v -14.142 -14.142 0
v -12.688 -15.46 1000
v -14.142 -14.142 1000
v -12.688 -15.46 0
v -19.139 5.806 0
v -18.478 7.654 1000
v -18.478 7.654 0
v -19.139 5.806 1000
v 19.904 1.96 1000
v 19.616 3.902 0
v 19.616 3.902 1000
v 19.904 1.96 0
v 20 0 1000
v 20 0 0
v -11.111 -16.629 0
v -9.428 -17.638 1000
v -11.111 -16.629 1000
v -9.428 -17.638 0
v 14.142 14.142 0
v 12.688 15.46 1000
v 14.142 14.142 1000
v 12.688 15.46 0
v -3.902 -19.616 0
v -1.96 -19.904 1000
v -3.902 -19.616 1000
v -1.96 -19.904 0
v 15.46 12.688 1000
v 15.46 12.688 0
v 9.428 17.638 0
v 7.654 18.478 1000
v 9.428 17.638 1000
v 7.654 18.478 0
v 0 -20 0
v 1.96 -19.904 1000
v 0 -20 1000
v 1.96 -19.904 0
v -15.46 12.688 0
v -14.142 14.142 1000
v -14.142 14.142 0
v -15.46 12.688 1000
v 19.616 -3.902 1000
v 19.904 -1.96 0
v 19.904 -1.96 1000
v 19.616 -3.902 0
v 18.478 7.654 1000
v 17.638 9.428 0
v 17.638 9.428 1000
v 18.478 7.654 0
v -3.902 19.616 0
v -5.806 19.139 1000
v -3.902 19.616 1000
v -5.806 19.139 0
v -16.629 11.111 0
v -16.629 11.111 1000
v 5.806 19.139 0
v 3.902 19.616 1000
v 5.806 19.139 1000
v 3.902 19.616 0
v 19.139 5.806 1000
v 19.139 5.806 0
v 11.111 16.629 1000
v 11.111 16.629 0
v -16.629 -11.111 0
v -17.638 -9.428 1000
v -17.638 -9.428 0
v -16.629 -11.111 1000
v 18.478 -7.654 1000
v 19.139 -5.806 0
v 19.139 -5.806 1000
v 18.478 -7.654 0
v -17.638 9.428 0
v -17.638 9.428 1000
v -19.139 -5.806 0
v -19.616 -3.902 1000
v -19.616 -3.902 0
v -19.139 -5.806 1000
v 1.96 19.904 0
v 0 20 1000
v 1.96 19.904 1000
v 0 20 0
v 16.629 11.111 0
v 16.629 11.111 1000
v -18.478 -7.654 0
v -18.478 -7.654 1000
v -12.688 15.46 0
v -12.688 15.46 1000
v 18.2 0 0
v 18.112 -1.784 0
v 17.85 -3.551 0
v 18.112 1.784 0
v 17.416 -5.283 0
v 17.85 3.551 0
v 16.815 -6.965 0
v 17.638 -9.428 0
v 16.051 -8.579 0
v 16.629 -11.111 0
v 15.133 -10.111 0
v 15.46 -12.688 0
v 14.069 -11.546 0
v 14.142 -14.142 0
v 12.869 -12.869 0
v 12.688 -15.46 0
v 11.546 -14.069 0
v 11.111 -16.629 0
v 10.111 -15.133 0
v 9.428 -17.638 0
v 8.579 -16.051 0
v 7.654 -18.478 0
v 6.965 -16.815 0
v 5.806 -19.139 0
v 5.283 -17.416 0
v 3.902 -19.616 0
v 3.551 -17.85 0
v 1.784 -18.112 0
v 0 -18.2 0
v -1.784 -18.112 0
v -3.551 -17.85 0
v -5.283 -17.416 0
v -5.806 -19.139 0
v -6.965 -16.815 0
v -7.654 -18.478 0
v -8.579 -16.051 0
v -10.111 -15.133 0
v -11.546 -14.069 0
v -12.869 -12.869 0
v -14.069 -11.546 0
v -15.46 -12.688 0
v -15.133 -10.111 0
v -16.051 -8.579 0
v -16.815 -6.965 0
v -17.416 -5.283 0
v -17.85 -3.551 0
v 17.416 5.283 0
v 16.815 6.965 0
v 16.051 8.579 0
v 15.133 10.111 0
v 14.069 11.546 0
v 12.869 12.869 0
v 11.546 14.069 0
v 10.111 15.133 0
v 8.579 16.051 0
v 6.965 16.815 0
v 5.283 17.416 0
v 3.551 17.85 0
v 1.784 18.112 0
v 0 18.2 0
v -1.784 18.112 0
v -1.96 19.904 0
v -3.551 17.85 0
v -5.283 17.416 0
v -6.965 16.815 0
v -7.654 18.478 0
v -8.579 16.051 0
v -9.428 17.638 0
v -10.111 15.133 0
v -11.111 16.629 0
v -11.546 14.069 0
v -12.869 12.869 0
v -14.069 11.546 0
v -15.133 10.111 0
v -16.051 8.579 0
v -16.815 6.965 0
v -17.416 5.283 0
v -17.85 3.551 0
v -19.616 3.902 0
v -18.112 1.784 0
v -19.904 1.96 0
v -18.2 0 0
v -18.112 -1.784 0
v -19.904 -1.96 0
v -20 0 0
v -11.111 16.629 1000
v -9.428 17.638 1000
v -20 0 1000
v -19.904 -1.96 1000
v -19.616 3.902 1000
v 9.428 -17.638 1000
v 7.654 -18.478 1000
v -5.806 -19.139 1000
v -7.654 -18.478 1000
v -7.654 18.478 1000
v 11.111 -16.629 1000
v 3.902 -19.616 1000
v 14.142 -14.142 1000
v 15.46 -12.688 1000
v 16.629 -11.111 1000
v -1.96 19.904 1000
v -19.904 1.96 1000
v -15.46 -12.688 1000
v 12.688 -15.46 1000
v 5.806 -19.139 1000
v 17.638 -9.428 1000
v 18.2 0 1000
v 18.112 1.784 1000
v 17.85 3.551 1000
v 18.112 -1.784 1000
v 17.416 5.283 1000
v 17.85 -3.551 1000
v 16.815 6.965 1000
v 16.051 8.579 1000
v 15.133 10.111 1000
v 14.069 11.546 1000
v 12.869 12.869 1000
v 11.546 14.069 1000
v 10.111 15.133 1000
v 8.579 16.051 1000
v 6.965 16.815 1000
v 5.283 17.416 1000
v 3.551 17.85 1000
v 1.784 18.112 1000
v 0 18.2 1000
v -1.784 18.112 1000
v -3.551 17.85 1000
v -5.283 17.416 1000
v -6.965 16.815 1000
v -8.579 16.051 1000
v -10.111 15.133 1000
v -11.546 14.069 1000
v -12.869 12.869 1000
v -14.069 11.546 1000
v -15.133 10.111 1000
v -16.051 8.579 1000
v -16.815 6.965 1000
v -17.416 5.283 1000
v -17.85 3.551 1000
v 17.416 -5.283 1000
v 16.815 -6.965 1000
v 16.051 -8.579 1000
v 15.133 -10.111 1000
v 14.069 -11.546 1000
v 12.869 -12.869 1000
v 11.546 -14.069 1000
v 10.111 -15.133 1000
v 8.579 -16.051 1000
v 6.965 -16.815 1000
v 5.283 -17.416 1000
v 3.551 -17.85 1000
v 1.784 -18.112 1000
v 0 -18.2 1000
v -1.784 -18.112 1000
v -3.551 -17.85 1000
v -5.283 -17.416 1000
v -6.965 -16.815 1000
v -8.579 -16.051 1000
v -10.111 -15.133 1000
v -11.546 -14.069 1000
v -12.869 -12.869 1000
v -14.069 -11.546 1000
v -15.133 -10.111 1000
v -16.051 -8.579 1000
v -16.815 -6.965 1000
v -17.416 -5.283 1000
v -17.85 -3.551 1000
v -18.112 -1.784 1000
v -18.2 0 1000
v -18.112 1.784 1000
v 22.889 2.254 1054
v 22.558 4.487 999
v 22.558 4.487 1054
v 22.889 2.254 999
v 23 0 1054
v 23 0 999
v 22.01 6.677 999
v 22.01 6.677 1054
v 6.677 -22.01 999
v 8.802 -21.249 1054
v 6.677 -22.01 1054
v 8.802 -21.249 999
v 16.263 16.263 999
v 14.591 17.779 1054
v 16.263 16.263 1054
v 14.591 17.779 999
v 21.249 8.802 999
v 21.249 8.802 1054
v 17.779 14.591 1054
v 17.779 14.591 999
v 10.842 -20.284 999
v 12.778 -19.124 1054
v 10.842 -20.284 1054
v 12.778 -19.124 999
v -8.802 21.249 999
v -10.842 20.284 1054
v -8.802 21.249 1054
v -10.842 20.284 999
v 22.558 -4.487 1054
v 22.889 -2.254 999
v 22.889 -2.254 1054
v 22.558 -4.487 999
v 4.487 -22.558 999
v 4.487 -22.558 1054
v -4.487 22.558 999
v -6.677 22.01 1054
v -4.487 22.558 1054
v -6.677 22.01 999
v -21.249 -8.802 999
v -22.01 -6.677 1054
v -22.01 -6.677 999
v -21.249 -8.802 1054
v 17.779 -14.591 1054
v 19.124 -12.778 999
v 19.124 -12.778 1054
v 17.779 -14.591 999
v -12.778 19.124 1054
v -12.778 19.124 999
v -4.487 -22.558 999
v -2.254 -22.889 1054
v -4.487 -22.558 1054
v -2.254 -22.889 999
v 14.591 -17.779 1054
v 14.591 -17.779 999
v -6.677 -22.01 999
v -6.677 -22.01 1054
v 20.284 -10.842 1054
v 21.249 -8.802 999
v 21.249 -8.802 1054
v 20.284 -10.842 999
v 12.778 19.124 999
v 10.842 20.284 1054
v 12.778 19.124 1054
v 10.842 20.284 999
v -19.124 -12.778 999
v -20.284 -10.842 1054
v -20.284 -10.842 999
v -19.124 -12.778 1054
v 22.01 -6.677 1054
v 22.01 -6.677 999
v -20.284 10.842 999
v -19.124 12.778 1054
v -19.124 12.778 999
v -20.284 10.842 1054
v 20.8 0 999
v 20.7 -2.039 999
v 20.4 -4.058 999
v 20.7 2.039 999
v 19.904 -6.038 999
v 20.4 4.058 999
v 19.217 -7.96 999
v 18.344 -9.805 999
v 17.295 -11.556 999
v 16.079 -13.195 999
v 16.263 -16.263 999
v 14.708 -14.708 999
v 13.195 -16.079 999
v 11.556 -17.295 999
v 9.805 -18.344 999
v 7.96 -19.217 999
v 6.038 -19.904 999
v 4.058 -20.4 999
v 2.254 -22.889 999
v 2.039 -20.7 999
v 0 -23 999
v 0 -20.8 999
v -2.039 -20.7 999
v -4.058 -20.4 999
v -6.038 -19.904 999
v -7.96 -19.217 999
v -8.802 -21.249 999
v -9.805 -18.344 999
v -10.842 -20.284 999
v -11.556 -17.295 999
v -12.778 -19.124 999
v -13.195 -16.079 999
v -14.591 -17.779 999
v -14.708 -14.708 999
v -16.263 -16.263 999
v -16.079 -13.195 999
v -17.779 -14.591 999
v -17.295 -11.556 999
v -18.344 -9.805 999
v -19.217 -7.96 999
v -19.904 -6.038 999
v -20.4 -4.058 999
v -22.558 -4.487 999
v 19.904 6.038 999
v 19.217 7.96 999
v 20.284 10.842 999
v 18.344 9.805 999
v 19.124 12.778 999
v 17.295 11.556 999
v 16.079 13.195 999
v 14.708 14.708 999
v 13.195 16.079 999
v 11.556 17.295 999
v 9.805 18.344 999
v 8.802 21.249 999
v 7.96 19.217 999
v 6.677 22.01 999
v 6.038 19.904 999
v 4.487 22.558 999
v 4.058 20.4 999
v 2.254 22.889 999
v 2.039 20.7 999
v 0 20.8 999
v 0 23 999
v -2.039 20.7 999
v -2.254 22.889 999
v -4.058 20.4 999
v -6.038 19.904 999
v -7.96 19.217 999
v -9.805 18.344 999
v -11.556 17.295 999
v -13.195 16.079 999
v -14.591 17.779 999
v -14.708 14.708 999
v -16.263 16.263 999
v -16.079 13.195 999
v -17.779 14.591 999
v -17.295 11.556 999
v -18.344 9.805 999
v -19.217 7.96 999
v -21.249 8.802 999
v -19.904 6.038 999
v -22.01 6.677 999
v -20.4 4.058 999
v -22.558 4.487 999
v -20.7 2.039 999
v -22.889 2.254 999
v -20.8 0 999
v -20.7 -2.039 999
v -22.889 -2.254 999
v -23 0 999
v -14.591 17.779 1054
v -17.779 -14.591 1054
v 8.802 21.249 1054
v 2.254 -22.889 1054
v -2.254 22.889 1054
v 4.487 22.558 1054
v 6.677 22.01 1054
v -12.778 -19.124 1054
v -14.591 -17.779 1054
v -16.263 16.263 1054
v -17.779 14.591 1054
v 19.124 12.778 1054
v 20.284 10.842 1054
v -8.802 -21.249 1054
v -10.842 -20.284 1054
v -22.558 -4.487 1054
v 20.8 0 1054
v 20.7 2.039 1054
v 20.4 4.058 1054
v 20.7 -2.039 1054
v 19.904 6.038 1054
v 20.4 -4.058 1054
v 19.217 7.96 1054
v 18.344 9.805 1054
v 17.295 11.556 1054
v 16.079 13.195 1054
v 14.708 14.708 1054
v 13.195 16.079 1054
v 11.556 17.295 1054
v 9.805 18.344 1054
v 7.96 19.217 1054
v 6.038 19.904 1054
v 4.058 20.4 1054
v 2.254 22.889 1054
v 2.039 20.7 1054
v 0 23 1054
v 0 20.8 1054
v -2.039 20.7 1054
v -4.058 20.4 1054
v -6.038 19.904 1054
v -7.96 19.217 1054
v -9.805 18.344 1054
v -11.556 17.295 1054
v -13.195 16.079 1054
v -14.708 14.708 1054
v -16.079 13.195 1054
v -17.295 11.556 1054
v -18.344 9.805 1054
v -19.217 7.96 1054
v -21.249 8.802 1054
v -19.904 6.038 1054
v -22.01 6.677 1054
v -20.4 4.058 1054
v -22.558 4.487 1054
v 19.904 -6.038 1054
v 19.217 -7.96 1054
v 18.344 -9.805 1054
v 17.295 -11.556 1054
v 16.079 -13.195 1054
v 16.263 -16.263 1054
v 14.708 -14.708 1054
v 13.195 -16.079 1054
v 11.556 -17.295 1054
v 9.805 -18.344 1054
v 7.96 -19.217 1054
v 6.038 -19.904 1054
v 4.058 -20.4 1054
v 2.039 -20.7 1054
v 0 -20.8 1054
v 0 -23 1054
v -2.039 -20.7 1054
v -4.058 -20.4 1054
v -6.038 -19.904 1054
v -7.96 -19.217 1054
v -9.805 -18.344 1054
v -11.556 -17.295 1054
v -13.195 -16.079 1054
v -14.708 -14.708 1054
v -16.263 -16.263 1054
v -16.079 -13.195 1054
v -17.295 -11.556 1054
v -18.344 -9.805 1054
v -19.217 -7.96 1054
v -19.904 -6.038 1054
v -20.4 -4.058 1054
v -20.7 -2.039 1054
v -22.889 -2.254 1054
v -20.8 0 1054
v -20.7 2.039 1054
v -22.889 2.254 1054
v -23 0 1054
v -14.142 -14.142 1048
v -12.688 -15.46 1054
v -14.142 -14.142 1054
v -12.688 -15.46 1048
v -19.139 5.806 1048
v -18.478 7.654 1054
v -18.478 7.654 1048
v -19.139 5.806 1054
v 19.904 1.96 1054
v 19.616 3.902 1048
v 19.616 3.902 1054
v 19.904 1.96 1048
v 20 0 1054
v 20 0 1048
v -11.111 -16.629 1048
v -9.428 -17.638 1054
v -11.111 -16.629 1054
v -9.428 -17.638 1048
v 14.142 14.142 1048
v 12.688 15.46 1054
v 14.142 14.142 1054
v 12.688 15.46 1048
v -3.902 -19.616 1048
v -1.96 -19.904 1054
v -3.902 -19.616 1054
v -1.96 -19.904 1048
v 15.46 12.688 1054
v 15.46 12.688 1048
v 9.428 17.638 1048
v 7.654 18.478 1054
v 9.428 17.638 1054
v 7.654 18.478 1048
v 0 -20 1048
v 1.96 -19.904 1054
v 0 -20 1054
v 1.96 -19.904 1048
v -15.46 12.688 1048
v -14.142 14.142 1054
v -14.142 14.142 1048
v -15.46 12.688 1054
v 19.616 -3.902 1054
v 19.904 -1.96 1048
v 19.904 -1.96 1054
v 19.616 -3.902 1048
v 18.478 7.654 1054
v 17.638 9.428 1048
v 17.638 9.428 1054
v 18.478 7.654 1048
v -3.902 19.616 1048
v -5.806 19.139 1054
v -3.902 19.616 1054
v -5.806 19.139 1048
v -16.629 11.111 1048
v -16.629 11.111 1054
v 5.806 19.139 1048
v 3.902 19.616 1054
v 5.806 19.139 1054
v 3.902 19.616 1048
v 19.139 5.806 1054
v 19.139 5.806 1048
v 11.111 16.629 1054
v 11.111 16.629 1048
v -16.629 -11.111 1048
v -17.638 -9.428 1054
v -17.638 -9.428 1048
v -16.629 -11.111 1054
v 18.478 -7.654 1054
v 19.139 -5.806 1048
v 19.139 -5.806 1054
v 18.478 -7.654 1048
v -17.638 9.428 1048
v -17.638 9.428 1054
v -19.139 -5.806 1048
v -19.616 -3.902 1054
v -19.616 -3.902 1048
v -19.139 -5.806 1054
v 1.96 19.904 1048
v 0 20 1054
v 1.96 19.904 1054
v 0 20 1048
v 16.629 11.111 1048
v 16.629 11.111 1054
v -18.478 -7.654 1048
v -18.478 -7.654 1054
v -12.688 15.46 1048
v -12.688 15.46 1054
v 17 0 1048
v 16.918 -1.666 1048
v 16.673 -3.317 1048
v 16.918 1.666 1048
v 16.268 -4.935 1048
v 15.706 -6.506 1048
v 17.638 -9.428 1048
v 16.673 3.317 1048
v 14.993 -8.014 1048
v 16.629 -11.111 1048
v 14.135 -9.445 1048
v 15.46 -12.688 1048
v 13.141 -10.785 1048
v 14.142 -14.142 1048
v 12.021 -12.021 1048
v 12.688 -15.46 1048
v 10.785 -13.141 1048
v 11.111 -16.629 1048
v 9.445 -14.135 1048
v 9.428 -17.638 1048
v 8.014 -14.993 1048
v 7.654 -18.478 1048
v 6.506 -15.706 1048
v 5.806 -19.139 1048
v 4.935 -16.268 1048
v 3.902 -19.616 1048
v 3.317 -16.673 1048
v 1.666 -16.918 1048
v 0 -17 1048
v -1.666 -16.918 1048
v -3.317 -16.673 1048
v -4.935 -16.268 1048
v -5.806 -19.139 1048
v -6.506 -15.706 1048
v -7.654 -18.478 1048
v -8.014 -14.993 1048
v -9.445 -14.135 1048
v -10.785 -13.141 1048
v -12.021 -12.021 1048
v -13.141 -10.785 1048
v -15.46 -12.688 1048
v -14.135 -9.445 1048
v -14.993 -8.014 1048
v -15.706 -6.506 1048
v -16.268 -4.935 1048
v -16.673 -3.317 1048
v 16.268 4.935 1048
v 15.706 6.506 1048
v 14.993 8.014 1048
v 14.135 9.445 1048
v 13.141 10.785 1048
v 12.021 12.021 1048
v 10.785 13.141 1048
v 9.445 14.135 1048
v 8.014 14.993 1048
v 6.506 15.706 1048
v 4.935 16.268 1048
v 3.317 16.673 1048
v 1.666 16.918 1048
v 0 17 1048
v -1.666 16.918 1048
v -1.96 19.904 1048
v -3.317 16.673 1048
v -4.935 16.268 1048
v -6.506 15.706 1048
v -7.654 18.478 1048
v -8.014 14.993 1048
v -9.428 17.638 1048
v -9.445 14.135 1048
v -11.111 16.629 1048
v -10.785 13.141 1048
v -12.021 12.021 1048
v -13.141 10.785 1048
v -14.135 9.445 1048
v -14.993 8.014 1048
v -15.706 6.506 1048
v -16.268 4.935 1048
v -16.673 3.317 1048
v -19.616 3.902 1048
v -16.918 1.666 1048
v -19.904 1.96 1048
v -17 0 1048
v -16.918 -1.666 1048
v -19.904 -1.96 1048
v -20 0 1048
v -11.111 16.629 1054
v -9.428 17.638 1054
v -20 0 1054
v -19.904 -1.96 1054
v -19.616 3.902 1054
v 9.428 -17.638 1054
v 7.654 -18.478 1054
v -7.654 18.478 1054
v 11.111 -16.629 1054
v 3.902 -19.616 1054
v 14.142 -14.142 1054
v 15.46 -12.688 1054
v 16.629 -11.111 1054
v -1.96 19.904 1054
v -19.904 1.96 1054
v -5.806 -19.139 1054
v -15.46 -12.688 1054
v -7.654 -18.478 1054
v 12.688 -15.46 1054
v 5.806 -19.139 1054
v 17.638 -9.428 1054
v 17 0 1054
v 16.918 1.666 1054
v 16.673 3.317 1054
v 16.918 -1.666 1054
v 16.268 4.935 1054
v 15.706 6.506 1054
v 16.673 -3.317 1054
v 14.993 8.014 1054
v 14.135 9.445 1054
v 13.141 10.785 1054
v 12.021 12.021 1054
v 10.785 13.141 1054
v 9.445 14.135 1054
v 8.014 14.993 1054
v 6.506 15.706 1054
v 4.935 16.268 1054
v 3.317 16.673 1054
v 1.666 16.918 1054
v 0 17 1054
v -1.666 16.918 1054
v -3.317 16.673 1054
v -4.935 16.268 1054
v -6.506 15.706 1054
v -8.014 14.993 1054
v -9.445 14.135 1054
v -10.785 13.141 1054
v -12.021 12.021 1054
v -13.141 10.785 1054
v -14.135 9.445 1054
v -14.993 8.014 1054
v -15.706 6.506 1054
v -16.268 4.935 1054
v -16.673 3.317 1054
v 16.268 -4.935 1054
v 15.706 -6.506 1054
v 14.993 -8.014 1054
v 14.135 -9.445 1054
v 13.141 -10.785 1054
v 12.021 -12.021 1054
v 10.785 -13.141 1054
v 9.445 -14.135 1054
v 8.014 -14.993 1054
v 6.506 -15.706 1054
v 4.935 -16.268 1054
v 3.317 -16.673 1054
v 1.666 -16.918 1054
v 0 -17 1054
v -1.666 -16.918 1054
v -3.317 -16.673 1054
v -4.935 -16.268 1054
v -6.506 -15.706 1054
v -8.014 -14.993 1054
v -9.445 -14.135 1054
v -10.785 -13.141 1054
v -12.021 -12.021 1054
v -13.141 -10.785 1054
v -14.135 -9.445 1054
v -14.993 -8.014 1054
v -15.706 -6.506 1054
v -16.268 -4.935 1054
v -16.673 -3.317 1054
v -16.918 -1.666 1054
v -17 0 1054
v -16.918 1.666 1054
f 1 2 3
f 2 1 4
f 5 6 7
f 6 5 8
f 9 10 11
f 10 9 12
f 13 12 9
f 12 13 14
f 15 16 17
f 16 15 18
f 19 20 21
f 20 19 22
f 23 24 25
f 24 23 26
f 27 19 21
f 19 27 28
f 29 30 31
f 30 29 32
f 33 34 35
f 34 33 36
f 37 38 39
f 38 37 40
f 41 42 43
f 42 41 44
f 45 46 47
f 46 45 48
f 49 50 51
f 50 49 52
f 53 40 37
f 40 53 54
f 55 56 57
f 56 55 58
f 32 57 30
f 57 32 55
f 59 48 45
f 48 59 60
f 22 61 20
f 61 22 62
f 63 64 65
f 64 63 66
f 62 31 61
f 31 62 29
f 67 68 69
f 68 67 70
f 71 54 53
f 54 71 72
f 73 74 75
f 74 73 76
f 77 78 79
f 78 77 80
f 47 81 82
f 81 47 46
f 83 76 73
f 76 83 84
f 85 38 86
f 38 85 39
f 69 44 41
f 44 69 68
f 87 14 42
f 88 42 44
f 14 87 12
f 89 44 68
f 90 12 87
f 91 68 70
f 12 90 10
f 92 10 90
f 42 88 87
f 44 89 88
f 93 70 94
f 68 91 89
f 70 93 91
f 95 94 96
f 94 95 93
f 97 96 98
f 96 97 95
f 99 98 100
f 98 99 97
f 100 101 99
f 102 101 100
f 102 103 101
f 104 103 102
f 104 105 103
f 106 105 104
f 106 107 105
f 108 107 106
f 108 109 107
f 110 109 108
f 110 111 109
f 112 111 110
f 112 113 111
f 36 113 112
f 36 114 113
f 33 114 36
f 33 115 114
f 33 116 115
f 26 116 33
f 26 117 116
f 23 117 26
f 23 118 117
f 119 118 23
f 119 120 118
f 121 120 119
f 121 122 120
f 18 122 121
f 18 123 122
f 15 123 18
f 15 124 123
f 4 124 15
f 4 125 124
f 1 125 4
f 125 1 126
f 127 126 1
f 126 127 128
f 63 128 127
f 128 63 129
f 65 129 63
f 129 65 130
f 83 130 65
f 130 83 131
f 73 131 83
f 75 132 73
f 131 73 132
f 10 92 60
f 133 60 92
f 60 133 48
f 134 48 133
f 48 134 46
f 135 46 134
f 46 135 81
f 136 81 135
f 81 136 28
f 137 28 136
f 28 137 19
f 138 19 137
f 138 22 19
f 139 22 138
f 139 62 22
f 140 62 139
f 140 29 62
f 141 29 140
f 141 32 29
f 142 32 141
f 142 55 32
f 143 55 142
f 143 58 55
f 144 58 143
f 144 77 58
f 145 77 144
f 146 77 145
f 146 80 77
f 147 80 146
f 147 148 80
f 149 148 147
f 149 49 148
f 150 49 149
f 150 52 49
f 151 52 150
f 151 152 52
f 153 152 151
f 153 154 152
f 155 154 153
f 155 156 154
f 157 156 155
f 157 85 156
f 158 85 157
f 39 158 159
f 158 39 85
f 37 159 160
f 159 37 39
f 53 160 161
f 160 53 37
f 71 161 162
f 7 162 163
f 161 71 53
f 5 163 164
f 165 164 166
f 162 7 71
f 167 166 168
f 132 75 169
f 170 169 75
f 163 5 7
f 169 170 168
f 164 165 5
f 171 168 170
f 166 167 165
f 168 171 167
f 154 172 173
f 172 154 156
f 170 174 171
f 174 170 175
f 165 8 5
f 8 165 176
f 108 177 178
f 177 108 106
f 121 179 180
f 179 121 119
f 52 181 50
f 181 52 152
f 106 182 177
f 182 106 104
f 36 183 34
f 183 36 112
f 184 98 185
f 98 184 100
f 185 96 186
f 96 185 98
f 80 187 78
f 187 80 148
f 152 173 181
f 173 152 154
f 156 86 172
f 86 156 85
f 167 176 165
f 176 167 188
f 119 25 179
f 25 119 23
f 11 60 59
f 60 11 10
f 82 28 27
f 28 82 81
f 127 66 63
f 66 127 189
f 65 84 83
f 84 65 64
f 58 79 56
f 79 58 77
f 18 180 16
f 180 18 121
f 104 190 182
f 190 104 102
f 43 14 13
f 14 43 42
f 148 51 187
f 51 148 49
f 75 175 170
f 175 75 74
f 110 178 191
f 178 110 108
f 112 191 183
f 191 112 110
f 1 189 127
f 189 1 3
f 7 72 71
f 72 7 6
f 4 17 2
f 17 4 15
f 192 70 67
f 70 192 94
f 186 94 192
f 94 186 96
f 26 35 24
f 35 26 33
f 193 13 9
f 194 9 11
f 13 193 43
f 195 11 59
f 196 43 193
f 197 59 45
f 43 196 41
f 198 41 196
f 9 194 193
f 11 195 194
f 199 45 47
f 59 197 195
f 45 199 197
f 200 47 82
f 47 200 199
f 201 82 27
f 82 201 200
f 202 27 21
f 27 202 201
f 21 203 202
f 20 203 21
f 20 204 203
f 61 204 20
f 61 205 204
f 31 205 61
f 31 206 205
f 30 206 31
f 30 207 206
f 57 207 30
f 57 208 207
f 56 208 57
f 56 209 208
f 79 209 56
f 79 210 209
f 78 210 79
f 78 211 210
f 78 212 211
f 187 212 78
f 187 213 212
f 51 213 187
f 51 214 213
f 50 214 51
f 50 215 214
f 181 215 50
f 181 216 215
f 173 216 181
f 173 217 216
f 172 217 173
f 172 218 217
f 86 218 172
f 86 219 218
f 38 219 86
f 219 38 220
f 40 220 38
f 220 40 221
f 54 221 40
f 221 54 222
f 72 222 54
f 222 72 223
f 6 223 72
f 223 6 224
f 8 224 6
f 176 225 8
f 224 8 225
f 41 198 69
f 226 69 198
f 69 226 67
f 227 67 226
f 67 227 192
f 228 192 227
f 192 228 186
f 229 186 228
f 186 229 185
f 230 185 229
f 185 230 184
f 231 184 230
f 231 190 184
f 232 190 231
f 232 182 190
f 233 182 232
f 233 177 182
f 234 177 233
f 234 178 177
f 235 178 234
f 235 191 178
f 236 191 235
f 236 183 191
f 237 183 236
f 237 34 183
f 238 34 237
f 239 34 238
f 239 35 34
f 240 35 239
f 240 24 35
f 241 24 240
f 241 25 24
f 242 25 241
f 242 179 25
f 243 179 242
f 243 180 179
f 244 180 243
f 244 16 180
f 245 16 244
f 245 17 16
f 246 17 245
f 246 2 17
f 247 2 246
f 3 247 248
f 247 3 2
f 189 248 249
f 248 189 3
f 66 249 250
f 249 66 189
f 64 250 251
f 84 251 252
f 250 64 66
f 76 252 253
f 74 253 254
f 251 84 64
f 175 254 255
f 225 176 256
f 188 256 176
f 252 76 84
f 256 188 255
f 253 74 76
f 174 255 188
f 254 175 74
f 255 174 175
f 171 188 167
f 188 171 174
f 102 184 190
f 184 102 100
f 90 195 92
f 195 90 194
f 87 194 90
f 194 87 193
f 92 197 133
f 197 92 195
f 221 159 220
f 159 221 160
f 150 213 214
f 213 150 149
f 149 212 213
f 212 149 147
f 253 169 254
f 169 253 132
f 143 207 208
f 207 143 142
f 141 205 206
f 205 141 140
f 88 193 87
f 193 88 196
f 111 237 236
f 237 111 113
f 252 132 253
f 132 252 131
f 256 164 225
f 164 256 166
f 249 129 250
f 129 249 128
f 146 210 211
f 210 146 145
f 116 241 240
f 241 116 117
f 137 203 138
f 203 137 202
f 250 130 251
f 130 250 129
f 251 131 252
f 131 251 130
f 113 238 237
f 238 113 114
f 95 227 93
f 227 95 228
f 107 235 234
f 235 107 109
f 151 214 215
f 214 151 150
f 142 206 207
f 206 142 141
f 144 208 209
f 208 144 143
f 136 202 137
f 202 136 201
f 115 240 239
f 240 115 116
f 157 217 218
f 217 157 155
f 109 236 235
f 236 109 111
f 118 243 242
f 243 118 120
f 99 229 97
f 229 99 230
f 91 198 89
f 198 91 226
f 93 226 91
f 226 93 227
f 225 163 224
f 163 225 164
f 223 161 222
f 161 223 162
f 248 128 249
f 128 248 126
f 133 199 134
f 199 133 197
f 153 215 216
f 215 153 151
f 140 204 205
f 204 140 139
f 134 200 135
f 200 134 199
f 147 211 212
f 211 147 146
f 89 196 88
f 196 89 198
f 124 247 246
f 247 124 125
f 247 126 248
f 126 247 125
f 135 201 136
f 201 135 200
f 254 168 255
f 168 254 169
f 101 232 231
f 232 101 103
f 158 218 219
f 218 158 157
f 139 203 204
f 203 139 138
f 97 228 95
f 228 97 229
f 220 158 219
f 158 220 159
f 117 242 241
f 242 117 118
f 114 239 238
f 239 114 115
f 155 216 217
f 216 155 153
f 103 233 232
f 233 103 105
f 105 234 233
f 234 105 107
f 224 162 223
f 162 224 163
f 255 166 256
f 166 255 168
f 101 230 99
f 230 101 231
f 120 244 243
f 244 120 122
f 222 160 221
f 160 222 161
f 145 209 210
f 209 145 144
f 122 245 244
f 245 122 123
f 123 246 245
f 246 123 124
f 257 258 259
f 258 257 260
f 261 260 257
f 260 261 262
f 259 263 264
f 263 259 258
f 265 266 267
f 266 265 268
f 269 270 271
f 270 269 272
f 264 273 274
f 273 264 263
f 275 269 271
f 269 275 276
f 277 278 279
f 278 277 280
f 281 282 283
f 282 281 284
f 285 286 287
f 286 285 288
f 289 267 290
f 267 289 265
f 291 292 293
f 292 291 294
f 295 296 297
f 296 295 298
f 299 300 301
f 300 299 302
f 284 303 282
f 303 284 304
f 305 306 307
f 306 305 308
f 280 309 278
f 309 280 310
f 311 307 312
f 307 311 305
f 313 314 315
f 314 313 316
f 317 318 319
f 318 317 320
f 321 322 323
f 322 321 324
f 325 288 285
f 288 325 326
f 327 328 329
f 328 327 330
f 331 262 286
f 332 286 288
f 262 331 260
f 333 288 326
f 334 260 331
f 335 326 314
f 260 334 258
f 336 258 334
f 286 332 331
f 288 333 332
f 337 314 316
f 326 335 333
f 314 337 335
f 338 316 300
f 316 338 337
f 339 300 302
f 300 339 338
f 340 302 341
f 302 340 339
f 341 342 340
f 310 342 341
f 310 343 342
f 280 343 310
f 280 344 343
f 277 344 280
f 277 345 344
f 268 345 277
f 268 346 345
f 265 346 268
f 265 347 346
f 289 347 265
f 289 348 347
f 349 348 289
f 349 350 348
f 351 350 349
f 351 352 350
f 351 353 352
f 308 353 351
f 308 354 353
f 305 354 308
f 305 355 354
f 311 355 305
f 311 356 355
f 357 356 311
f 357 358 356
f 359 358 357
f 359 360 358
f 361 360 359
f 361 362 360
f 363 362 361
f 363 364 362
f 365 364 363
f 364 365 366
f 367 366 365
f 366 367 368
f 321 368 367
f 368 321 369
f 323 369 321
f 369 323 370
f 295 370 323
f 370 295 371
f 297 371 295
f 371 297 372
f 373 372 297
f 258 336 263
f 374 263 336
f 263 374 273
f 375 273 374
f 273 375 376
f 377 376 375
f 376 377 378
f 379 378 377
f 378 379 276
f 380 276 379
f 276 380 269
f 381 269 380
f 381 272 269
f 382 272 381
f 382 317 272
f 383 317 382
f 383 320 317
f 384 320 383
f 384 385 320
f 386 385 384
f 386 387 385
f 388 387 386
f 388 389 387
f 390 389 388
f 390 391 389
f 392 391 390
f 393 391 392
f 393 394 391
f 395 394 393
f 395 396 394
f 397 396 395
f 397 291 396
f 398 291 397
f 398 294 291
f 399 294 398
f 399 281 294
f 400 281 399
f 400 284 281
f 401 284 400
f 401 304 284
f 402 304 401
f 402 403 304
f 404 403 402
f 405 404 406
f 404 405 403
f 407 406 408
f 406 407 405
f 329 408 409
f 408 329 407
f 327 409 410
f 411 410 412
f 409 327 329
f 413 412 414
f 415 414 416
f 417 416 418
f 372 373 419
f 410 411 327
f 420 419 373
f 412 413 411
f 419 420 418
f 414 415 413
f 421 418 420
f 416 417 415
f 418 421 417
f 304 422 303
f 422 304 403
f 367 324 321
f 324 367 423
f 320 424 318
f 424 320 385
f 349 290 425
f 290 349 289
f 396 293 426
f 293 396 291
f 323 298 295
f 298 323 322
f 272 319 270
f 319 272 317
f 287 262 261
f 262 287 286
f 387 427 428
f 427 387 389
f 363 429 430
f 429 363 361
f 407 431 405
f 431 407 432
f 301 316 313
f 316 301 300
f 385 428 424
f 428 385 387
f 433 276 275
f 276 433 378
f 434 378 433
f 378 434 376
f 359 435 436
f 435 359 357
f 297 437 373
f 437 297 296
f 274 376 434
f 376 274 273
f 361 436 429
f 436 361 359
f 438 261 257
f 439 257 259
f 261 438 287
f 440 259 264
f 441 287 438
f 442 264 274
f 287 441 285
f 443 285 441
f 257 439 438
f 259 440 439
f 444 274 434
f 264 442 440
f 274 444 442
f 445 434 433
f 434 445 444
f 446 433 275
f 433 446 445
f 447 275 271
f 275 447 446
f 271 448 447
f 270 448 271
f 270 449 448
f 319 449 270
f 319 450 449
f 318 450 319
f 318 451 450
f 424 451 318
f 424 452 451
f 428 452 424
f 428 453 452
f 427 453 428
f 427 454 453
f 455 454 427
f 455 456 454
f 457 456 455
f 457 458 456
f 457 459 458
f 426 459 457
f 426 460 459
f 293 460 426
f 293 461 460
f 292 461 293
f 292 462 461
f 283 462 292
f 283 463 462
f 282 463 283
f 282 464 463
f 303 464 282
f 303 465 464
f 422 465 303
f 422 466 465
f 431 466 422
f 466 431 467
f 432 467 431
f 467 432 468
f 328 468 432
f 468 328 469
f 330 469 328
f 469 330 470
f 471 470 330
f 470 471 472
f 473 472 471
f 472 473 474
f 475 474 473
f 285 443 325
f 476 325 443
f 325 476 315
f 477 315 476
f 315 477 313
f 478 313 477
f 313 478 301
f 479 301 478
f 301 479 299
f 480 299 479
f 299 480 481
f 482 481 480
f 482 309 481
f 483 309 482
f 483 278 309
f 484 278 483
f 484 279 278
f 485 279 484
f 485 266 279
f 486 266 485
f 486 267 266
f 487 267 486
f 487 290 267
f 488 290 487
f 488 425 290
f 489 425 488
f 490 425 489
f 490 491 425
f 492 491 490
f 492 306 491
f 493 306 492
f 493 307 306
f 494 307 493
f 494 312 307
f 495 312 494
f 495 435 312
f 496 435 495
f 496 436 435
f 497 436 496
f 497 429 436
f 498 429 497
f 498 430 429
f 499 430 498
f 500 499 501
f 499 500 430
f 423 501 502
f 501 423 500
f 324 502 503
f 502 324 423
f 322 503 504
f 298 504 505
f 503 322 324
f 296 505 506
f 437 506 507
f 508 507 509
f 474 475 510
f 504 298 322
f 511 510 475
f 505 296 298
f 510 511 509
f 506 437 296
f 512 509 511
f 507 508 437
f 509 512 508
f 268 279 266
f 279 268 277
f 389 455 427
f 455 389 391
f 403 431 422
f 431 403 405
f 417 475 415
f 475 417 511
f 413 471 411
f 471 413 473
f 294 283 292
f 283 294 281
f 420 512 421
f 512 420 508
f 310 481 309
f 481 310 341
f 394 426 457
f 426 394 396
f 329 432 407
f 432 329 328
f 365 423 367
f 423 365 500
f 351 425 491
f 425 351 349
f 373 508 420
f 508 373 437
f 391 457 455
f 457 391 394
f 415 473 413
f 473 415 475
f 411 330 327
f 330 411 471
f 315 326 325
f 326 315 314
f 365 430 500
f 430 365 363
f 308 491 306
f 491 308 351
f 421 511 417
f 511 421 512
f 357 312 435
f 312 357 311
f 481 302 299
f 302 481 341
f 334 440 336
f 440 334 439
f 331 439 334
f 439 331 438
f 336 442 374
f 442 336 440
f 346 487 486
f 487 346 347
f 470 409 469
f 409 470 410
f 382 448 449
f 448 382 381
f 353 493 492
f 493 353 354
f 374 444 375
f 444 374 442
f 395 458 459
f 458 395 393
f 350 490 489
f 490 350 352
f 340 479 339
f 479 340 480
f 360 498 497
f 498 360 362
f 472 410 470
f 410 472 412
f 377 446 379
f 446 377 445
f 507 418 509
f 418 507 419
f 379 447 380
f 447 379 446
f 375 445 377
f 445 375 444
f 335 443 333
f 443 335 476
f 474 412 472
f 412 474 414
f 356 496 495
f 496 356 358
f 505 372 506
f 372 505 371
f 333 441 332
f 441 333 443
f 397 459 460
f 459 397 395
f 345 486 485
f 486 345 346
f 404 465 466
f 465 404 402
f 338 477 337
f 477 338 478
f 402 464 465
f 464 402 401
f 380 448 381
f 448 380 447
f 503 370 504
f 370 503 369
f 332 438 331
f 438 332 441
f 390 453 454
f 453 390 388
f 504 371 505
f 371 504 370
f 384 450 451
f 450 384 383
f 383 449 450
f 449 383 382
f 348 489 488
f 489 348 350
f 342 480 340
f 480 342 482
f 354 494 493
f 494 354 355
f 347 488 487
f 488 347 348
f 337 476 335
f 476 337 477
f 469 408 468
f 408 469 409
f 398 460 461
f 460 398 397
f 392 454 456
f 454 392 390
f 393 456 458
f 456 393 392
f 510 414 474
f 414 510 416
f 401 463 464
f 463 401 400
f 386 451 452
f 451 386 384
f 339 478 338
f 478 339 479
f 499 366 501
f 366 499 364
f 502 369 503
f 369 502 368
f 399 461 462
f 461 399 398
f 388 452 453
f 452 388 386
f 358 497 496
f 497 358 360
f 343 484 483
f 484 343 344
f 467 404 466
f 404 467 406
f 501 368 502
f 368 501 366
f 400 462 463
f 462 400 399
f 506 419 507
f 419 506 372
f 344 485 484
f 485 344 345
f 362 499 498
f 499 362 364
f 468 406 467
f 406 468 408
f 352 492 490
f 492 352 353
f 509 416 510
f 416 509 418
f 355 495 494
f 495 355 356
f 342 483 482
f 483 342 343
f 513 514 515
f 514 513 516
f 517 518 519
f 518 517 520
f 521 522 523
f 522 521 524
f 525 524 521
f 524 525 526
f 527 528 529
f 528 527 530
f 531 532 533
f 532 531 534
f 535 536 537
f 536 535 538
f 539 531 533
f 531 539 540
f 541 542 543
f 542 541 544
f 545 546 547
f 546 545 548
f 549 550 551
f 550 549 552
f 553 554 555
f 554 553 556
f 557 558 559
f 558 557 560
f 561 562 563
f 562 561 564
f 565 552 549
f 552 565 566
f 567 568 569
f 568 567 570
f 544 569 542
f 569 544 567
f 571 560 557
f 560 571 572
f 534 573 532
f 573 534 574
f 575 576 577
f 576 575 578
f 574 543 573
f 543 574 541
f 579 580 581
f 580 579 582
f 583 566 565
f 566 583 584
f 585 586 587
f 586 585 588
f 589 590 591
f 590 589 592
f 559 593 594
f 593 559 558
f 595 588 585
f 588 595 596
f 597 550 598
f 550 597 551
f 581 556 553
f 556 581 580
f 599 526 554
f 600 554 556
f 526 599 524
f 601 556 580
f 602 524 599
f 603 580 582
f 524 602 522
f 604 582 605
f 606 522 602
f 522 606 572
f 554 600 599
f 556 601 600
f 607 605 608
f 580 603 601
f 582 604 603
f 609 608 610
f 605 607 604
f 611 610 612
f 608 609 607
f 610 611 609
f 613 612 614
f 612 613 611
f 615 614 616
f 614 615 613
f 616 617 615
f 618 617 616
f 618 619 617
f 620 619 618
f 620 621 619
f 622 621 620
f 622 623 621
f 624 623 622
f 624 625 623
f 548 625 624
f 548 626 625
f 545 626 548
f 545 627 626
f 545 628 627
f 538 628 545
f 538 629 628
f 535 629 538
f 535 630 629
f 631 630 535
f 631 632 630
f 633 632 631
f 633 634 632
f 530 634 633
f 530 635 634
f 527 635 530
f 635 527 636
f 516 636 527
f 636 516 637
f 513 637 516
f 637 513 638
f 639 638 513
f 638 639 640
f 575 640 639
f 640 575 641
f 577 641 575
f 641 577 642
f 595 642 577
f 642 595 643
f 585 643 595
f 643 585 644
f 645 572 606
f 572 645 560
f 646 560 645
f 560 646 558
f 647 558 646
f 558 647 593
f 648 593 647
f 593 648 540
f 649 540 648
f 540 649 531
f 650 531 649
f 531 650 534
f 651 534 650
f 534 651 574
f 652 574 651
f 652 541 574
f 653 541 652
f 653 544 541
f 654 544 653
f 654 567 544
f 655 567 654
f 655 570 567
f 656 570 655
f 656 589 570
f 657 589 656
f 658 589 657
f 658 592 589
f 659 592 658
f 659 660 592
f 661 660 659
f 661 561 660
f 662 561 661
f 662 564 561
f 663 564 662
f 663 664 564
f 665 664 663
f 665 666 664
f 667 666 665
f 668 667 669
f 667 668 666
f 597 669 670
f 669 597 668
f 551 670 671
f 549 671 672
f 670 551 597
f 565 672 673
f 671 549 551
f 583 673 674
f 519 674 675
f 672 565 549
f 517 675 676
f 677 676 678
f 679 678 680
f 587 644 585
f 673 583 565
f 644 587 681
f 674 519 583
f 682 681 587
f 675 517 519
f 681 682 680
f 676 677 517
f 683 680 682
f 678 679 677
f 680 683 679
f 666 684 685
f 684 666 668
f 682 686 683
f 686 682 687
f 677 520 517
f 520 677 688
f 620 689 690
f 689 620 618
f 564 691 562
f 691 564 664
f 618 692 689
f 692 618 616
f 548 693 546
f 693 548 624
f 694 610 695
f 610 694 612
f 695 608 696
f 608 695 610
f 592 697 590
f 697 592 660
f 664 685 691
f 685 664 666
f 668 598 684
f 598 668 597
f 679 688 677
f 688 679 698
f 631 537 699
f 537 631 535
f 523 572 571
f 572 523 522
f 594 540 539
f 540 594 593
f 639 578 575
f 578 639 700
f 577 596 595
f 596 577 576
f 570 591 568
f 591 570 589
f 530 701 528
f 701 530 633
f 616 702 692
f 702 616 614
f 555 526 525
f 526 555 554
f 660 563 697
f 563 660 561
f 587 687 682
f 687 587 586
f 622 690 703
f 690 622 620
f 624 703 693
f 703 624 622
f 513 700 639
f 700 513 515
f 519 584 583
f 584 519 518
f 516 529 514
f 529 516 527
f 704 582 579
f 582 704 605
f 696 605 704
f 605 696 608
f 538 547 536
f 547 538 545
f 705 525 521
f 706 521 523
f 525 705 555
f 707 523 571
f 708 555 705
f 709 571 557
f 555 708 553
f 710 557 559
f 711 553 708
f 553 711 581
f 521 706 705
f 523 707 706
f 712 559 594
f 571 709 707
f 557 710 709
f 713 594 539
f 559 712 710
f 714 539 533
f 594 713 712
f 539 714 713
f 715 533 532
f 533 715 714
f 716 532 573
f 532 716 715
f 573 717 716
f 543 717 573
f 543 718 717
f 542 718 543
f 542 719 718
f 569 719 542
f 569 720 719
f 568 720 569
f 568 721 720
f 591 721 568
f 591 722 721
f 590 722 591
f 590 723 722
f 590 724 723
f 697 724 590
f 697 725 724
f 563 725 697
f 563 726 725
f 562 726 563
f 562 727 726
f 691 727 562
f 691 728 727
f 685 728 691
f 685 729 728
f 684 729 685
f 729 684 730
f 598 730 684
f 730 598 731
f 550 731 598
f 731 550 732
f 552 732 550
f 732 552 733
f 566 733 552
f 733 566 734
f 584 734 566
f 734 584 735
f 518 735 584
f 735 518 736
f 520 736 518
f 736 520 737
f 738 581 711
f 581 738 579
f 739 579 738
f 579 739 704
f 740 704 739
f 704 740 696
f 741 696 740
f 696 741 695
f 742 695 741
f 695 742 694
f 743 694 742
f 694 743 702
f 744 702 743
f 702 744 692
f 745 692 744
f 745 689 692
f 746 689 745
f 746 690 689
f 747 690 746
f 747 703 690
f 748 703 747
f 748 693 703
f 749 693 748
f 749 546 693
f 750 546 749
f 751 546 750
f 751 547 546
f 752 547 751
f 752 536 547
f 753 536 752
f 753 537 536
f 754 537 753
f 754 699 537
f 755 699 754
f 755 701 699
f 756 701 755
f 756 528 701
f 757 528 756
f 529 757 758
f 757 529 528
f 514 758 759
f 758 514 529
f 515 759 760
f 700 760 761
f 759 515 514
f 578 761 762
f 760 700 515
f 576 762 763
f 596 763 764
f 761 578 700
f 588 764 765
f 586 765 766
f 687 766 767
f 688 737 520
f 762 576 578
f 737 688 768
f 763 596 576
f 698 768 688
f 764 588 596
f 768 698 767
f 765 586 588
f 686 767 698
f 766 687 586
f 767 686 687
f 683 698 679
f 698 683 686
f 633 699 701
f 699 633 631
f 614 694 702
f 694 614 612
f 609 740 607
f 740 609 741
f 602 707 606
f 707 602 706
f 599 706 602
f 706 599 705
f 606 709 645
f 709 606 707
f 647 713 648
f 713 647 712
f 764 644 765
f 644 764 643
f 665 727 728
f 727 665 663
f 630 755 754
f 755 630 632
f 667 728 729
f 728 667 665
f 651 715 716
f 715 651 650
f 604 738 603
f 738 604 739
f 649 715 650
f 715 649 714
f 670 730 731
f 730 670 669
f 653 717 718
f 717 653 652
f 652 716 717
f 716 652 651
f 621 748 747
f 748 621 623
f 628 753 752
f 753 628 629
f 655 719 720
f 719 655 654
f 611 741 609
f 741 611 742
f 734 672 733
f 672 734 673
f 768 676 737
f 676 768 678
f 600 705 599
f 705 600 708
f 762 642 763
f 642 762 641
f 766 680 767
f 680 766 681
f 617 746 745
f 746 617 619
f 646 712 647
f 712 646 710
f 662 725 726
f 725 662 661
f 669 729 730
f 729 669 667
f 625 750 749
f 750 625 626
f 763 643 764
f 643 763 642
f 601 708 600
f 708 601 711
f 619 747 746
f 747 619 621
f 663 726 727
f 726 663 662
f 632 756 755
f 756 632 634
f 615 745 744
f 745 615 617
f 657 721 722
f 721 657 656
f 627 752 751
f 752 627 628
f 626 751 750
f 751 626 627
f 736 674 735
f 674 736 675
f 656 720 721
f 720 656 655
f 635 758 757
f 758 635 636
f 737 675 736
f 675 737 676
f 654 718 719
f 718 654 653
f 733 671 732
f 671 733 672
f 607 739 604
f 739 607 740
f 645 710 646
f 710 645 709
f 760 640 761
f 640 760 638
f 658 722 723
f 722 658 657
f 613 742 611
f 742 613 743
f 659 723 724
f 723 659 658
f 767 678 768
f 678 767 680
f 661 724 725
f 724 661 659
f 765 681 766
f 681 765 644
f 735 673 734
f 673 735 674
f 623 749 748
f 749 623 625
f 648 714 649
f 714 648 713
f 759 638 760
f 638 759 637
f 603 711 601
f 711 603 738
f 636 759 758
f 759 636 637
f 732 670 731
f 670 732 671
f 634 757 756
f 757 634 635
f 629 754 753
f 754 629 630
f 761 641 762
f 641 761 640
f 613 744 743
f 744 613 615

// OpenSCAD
// Parameters
pipe_standard = 1; //[1:1:1]
nominal_diameter = 40; //[20:80:1]
length_mm = 1000; //[500:2000:10]
pipe_od = 40; //[20:80:1]
pipe_wall = 1.8; //[1.0:3.6:0.1]
fit_socket_od = 46; //[35:70:0.5]
fit_socket_len = 55; //[30:110:1]
fit_socket_wall = 2.2; //[1.2:4.4:0.1]
fit_stop_thickness = 3; //[1:8:0.5]
fit_stop_len = 6; //[2:15:0.5]
fit_overlap = 1; //[0.5:2:0.1]

// HT Pipe - complete geometry
module ht_pipe() {
  color([0.85, 0.85, 0.8]) {
    // Pipe segment
    difference() {
      translate([0, 0, 0])
        cylinder(h=length_mm, r=pipe_od/2, center=false, $fn=64);
      translate([0, 0, -fit_overlap])
        cylinder(h=length_mm + fit_overlap*2, r=pipe_od/2 - pipe_wall, center=false, $fn=64);
    }
    
    // End fitting
    union() {
      // Outer shell
      difference() {
        translate([0, 0, length_mm - fit_overlap])
          cylinder(h=fit_socket_len, r=fit_socket_od/2, center=false, $fn=64);
        translate([0, 0, length_mm - fit_overlap*2])
          cylinder(h=fit_socket_len + fit_overlap*2, r=fit_socket_od/2 - fit_socket_wall, center=false, $fn=64);
      }
      
      // Stop ring
      difference() {
        translate([0, 0, length_mm + fit_socket_len - fit_stop_len - fit_overlap])
          cylinder(h=fit_stop_len, r=pipe_od/2, center=false, $fn=64);
        translate([0, 0, length_mm + fit_socket_len - fit_stop_len - fit_overlap*2])
          cylinder(h=fit_stop_len + fit_overlap*2, r=pipe_od/2 - fit_stop_thickness, center=false, $fn=64);
      }
    }
  }
}

// Assembly
module assembly() {
  ht_pipe();
}

assembly();
